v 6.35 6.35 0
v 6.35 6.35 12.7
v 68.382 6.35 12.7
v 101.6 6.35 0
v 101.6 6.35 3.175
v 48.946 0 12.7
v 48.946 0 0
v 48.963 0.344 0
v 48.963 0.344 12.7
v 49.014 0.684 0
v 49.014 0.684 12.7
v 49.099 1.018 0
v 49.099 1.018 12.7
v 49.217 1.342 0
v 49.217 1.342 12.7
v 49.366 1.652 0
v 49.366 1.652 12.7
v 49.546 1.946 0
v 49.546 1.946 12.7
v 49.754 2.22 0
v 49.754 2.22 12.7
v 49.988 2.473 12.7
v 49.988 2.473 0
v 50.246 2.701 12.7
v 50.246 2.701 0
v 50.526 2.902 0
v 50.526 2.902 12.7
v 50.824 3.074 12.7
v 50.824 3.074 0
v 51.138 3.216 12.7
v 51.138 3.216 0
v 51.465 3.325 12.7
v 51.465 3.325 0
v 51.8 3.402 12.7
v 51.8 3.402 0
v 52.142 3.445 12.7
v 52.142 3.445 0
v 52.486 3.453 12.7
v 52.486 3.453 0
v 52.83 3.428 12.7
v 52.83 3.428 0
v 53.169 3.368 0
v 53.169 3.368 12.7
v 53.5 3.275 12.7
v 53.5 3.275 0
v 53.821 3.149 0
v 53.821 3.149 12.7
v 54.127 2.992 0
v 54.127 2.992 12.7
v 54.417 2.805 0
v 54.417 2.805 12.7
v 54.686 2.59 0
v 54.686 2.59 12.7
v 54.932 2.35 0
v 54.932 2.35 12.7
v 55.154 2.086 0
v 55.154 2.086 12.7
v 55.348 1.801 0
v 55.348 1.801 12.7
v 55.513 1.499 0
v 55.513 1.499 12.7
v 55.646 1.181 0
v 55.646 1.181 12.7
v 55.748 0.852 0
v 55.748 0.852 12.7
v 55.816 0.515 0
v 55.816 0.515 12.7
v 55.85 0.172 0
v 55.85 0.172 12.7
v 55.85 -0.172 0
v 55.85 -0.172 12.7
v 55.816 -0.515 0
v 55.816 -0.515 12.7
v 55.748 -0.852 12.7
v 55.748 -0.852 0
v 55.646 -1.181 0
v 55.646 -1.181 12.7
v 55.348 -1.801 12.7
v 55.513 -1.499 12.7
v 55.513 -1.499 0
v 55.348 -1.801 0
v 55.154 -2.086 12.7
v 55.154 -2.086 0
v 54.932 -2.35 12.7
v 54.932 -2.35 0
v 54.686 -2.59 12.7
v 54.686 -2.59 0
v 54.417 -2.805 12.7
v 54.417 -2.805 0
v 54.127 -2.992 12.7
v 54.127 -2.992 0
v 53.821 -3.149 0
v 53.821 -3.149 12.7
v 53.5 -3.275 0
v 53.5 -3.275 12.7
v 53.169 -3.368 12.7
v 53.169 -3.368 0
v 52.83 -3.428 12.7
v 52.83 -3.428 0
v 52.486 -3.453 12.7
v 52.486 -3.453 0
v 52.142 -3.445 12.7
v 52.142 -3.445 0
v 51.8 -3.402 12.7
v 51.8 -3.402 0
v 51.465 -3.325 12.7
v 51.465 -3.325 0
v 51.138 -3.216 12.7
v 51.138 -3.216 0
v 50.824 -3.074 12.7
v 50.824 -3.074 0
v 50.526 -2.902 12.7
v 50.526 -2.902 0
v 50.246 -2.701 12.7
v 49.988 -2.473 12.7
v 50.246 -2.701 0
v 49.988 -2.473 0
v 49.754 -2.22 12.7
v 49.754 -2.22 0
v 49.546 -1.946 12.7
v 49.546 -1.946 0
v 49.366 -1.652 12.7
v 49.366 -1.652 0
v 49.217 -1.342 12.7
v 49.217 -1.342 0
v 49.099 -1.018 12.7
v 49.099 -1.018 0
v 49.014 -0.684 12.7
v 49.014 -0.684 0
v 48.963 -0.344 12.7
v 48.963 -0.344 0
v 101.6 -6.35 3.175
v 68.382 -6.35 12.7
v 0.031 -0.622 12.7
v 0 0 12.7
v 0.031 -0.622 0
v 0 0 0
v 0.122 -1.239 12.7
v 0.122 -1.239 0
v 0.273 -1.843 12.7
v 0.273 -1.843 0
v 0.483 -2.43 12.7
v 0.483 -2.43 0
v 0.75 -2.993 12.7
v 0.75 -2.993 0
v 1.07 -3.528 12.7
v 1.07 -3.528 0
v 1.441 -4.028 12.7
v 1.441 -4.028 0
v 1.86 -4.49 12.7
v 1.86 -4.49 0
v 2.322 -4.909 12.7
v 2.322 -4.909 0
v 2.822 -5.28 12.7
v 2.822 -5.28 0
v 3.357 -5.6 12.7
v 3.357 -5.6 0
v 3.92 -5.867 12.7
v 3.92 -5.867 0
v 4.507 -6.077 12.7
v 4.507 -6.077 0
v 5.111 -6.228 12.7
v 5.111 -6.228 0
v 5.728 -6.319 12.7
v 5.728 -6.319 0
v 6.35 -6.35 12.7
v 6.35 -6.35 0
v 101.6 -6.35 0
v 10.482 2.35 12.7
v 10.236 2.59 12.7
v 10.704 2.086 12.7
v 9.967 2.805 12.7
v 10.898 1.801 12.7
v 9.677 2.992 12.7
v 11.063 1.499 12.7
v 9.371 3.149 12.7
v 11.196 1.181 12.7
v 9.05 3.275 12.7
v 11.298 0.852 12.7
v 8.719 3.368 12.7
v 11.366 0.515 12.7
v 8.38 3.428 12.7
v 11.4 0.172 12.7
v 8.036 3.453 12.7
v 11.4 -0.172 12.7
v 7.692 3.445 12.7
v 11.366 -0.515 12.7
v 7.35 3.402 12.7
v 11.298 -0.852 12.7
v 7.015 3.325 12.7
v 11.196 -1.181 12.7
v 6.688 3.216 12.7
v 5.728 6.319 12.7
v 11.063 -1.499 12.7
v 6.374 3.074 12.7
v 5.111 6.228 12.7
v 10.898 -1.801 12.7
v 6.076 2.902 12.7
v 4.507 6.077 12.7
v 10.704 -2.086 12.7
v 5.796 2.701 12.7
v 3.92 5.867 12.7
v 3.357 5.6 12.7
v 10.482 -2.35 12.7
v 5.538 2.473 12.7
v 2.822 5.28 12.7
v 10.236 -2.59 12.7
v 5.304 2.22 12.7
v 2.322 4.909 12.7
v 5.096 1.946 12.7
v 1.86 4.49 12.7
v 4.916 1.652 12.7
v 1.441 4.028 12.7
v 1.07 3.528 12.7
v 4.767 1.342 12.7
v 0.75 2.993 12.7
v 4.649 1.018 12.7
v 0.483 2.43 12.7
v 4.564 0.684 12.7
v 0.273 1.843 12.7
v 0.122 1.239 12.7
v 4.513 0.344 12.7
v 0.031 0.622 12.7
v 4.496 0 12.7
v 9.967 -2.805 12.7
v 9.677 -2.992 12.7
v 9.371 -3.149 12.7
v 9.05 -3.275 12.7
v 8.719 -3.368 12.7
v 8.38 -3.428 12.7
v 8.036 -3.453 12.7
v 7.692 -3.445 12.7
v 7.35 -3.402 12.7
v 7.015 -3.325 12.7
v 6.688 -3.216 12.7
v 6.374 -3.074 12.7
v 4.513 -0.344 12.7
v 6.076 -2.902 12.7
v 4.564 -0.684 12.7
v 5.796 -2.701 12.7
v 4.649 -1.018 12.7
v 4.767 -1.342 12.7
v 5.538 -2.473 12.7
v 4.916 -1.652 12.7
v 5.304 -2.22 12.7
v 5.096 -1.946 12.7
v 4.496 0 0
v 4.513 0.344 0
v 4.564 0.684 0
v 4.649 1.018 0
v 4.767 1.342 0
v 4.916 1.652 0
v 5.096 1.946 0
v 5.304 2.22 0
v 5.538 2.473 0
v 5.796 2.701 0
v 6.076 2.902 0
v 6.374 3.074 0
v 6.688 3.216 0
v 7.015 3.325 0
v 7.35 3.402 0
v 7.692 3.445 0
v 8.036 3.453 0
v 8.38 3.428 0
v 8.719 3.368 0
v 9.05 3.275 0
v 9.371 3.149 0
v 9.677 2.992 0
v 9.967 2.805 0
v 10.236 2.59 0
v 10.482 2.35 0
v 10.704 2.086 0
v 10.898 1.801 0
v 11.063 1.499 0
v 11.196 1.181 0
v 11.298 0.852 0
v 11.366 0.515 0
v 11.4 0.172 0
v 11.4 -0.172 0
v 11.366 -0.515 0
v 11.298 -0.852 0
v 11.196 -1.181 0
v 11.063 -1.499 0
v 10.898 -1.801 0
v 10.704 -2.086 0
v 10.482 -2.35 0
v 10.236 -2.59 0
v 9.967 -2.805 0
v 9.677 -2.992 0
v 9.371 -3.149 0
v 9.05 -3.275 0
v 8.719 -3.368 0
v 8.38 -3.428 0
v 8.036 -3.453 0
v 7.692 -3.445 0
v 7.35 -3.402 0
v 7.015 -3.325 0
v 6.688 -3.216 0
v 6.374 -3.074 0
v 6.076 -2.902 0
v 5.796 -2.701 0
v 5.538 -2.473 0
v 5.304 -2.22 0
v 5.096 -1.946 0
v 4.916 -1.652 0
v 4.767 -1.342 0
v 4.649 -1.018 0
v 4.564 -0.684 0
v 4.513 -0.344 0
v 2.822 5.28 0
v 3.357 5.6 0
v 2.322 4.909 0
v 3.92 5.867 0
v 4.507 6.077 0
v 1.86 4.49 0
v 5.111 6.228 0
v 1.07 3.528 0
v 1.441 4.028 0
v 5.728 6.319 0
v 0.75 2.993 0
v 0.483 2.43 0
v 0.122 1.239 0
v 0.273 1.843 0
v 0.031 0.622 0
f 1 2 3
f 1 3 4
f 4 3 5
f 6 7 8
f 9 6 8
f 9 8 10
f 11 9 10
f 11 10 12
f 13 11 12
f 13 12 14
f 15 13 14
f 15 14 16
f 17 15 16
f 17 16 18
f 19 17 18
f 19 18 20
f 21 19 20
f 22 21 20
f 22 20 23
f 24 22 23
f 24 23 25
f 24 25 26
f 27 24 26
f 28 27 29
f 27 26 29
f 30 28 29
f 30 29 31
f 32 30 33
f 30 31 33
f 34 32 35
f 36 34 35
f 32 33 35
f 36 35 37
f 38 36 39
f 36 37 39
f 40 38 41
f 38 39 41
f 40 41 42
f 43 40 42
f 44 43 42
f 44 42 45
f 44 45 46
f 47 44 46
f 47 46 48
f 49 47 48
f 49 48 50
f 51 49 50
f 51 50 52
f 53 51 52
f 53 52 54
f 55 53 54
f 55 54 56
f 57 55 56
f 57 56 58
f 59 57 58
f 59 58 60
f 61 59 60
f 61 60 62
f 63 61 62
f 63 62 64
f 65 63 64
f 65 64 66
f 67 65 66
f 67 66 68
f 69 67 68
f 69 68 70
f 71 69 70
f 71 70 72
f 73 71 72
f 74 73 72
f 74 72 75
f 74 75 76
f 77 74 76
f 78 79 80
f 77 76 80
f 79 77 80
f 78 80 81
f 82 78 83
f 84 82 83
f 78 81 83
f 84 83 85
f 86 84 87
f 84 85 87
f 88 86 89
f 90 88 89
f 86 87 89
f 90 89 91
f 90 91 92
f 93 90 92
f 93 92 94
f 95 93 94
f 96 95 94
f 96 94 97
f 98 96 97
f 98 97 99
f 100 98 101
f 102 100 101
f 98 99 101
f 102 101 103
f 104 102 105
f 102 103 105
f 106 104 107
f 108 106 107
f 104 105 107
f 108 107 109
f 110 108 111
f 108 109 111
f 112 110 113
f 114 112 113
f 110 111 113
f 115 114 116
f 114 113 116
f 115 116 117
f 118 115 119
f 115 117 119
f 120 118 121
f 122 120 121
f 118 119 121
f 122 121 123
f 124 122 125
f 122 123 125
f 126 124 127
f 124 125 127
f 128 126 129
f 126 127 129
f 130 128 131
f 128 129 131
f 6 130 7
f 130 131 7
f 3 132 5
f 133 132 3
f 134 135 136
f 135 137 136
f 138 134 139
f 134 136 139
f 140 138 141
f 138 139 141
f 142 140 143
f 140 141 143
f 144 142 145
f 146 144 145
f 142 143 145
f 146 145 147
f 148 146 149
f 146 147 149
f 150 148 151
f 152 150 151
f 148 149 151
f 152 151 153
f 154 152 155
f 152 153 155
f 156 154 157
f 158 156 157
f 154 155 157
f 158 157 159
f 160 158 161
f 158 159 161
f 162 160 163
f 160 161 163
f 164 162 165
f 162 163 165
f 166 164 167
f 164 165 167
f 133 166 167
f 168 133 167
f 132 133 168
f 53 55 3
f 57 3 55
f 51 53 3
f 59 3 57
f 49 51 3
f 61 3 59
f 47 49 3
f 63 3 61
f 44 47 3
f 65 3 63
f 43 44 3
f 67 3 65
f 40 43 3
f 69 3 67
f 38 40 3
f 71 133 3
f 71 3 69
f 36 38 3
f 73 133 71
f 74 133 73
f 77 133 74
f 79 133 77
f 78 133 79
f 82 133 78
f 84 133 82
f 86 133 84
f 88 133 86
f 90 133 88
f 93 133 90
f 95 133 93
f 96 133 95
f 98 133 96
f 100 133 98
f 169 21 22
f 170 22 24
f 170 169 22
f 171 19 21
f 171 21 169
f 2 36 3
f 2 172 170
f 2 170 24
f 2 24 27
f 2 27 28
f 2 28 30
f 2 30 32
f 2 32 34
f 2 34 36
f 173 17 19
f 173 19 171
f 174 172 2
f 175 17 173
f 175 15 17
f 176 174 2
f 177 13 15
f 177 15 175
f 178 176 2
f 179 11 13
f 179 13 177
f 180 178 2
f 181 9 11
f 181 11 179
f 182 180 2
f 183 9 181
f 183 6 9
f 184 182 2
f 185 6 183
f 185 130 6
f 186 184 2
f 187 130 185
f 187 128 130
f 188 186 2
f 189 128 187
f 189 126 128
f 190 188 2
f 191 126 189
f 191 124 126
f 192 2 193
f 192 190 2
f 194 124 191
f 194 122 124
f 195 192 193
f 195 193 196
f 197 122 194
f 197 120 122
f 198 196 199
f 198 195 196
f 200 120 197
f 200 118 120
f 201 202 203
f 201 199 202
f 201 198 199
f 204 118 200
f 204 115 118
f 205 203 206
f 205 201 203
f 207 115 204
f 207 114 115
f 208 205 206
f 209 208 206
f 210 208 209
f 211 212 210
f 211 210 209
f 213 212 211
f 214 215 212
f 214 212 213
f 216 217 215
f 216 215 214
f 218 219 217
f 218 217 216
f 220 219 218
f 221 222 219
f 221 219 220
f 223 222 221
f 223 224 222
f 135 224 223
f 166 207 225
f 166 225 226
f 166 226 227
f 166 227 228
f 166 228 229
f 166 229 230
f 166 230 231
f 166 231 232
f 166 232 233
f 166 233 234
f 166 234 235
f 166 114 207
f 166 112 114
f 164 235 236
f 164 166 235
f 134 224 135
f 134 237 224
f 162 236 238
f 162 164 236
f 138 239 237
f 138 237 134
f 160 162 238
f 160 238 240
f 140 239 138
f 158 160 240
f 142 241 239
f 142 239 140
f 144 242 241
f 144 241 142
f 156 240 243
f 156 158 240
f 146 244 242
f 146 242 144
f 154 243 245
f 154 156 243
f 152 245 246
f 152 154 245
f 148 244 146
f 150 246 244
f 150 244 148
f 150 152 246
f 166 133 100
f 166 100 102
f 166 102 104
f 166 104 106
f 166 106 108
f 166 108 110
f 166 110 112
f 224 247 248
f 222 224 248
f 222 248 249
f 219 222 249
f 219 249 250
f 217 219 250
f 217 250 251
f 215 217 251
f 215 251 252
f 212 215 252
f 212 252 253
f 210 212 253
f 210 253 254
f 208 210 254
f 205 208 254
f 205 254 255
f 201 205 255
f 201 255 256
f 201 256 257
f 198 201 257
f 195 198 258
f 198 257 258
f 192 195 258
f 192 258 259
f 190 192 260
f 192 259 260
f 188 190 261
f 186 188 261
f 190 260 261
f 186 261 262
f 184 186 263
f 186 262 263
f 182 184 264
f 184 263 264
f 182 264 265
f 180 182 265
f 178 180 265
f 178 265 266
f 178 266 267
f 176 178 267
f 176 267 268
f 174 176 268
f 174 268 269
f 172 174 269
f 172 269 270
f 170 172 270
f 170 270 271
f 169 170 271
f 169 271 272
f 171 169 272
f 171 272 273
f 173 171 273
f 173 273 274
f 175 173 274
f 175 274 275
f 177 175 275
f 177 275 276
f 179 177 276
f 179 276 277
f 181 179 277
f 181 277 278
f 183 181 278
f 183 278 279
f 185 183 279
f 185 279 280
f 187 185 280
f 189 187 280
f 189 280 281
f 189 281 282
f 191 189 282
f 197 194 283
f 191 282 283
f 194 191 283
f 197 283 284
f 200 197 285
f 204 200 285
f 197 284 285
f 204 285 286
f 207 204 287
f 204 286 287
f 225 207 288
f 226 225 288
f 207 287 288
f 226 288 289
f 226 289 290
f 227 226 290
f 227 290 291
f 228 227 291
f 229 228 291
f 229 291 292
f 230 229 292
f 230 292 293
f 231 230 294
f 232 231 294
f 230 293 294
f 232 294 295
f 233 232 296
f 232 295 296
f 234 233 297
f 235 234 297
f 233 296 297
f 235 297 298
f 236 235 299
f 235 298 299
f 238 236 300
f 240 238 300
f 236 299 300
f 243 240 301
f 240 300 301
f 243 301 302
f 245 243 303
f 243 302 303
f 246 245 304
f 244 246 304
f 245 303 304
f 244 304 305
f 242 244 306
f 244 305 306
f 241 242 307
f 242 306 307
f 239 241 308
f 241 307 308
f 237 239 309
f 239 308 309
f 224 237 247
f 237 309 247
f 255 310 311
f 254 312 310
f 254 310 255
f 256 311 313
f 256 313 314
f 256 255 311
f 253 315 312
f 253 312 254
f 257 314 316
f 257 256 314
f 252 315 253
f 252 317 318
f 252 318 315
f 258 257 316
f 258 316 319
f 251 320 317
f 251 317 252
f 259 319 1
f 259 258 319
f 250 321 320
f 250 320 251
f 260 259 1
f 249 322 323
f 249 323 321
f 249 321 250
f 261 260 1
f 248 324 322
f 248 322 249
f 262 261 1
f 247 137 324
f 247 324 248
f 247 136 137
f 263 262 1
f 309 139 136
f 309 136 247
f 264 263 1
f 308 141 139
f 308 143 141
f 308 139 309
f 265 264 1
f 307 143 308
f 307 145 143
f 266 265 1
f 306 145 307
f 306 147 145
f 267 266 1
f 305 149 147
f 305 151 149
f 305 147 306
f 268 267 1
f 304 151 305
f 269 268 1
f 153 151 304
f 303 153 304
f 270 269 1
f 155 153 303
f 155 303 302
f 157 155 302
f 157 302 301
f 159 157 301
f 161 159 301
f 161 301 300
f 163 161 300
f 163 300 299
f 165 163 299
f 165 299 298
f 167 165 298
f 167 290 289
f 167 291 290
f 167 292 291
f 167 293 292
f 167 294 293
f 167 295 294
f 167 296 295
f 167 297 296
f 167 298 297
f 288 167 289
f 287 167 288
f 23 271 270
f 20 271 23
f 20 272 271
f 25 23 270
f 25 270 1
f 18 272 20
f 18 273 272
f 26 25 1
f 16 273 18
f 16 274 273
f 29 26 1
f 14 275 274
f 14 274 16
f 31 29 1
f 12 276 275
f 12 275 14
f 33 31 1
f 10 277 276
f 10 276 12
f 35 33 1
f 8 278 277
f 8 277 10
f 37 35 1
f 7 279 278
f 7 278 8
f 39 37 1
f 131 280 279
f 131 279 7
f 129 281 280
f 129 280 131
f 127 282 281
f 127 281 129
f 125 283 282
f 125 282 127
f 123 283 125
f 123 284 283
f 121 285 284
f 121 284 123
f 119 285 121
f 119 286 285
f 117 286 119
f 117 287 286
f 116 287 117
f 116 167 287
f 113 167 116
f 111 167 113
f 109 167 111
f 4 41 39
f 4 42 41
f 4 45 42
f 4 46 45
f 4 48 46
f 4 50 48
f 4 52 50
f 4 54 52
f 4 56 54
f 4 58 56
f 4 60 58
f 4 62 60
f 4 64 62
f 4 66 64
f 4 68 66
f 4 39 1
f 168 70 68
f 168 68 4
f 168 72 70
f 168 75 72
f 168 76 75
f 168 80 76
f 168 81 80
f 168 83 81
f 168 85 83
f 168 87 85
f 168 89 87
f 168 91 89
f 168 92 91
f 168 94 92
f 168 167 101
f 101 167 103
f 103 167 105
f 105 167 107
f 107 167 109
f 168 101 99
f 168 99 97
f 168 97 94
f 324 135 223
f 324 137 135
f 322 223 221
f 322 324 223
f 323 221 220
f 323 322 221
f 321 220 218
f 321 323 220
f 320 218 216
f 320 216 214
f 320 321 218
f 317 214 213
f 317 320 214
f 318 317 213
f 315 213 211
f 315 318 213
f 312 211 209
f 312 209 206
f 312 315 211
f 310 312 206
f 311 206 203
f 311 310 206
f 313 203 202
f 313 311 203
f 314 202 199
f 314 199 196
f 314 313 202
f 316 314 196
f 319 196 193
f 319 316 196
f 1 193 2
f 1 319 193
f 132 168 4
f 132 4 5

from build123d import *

# Parameters (mm, degrees)
F1_DEPTH = 6.35
F3_R     = 6.34999
F4_D     = 6.9088


# Not quite as in the source:
# - a fillet or chamfer is up to 0.001 mm smaller than in the source, because OpenCascade refuses the exact size


with BuildPart() as f1:
    # F0 (on Front) → F1 (new body, symmetric)
    with BuildSketch(Plane.XZ):
        Polygon((0, 12.7), (0, 0), (101.6, 0), (101.6, 3.175), (68.3823774224, 12.7), align=None)
    extrude(amount=F1_DEPTH, both=True)

    # F3 (radius 6.35 in the source; OpenCascade refuses exactly that, so slightly less here)
    f3_edges = [f1.edges().sort_by_distance(p)[0] for p in [
        (0, -6.35, 6.35),
        (0, 6.35, 6.35),
    ]]
    fillet(f3_edges, radius=F3_R)

    # F4 (through all)
    with Locations(Plane.XY.offset(12.7)):
        with Locations((52.4002, 0), (7.9502, 0)):
            Hole(F4_D / 2)


solid = f1.part
